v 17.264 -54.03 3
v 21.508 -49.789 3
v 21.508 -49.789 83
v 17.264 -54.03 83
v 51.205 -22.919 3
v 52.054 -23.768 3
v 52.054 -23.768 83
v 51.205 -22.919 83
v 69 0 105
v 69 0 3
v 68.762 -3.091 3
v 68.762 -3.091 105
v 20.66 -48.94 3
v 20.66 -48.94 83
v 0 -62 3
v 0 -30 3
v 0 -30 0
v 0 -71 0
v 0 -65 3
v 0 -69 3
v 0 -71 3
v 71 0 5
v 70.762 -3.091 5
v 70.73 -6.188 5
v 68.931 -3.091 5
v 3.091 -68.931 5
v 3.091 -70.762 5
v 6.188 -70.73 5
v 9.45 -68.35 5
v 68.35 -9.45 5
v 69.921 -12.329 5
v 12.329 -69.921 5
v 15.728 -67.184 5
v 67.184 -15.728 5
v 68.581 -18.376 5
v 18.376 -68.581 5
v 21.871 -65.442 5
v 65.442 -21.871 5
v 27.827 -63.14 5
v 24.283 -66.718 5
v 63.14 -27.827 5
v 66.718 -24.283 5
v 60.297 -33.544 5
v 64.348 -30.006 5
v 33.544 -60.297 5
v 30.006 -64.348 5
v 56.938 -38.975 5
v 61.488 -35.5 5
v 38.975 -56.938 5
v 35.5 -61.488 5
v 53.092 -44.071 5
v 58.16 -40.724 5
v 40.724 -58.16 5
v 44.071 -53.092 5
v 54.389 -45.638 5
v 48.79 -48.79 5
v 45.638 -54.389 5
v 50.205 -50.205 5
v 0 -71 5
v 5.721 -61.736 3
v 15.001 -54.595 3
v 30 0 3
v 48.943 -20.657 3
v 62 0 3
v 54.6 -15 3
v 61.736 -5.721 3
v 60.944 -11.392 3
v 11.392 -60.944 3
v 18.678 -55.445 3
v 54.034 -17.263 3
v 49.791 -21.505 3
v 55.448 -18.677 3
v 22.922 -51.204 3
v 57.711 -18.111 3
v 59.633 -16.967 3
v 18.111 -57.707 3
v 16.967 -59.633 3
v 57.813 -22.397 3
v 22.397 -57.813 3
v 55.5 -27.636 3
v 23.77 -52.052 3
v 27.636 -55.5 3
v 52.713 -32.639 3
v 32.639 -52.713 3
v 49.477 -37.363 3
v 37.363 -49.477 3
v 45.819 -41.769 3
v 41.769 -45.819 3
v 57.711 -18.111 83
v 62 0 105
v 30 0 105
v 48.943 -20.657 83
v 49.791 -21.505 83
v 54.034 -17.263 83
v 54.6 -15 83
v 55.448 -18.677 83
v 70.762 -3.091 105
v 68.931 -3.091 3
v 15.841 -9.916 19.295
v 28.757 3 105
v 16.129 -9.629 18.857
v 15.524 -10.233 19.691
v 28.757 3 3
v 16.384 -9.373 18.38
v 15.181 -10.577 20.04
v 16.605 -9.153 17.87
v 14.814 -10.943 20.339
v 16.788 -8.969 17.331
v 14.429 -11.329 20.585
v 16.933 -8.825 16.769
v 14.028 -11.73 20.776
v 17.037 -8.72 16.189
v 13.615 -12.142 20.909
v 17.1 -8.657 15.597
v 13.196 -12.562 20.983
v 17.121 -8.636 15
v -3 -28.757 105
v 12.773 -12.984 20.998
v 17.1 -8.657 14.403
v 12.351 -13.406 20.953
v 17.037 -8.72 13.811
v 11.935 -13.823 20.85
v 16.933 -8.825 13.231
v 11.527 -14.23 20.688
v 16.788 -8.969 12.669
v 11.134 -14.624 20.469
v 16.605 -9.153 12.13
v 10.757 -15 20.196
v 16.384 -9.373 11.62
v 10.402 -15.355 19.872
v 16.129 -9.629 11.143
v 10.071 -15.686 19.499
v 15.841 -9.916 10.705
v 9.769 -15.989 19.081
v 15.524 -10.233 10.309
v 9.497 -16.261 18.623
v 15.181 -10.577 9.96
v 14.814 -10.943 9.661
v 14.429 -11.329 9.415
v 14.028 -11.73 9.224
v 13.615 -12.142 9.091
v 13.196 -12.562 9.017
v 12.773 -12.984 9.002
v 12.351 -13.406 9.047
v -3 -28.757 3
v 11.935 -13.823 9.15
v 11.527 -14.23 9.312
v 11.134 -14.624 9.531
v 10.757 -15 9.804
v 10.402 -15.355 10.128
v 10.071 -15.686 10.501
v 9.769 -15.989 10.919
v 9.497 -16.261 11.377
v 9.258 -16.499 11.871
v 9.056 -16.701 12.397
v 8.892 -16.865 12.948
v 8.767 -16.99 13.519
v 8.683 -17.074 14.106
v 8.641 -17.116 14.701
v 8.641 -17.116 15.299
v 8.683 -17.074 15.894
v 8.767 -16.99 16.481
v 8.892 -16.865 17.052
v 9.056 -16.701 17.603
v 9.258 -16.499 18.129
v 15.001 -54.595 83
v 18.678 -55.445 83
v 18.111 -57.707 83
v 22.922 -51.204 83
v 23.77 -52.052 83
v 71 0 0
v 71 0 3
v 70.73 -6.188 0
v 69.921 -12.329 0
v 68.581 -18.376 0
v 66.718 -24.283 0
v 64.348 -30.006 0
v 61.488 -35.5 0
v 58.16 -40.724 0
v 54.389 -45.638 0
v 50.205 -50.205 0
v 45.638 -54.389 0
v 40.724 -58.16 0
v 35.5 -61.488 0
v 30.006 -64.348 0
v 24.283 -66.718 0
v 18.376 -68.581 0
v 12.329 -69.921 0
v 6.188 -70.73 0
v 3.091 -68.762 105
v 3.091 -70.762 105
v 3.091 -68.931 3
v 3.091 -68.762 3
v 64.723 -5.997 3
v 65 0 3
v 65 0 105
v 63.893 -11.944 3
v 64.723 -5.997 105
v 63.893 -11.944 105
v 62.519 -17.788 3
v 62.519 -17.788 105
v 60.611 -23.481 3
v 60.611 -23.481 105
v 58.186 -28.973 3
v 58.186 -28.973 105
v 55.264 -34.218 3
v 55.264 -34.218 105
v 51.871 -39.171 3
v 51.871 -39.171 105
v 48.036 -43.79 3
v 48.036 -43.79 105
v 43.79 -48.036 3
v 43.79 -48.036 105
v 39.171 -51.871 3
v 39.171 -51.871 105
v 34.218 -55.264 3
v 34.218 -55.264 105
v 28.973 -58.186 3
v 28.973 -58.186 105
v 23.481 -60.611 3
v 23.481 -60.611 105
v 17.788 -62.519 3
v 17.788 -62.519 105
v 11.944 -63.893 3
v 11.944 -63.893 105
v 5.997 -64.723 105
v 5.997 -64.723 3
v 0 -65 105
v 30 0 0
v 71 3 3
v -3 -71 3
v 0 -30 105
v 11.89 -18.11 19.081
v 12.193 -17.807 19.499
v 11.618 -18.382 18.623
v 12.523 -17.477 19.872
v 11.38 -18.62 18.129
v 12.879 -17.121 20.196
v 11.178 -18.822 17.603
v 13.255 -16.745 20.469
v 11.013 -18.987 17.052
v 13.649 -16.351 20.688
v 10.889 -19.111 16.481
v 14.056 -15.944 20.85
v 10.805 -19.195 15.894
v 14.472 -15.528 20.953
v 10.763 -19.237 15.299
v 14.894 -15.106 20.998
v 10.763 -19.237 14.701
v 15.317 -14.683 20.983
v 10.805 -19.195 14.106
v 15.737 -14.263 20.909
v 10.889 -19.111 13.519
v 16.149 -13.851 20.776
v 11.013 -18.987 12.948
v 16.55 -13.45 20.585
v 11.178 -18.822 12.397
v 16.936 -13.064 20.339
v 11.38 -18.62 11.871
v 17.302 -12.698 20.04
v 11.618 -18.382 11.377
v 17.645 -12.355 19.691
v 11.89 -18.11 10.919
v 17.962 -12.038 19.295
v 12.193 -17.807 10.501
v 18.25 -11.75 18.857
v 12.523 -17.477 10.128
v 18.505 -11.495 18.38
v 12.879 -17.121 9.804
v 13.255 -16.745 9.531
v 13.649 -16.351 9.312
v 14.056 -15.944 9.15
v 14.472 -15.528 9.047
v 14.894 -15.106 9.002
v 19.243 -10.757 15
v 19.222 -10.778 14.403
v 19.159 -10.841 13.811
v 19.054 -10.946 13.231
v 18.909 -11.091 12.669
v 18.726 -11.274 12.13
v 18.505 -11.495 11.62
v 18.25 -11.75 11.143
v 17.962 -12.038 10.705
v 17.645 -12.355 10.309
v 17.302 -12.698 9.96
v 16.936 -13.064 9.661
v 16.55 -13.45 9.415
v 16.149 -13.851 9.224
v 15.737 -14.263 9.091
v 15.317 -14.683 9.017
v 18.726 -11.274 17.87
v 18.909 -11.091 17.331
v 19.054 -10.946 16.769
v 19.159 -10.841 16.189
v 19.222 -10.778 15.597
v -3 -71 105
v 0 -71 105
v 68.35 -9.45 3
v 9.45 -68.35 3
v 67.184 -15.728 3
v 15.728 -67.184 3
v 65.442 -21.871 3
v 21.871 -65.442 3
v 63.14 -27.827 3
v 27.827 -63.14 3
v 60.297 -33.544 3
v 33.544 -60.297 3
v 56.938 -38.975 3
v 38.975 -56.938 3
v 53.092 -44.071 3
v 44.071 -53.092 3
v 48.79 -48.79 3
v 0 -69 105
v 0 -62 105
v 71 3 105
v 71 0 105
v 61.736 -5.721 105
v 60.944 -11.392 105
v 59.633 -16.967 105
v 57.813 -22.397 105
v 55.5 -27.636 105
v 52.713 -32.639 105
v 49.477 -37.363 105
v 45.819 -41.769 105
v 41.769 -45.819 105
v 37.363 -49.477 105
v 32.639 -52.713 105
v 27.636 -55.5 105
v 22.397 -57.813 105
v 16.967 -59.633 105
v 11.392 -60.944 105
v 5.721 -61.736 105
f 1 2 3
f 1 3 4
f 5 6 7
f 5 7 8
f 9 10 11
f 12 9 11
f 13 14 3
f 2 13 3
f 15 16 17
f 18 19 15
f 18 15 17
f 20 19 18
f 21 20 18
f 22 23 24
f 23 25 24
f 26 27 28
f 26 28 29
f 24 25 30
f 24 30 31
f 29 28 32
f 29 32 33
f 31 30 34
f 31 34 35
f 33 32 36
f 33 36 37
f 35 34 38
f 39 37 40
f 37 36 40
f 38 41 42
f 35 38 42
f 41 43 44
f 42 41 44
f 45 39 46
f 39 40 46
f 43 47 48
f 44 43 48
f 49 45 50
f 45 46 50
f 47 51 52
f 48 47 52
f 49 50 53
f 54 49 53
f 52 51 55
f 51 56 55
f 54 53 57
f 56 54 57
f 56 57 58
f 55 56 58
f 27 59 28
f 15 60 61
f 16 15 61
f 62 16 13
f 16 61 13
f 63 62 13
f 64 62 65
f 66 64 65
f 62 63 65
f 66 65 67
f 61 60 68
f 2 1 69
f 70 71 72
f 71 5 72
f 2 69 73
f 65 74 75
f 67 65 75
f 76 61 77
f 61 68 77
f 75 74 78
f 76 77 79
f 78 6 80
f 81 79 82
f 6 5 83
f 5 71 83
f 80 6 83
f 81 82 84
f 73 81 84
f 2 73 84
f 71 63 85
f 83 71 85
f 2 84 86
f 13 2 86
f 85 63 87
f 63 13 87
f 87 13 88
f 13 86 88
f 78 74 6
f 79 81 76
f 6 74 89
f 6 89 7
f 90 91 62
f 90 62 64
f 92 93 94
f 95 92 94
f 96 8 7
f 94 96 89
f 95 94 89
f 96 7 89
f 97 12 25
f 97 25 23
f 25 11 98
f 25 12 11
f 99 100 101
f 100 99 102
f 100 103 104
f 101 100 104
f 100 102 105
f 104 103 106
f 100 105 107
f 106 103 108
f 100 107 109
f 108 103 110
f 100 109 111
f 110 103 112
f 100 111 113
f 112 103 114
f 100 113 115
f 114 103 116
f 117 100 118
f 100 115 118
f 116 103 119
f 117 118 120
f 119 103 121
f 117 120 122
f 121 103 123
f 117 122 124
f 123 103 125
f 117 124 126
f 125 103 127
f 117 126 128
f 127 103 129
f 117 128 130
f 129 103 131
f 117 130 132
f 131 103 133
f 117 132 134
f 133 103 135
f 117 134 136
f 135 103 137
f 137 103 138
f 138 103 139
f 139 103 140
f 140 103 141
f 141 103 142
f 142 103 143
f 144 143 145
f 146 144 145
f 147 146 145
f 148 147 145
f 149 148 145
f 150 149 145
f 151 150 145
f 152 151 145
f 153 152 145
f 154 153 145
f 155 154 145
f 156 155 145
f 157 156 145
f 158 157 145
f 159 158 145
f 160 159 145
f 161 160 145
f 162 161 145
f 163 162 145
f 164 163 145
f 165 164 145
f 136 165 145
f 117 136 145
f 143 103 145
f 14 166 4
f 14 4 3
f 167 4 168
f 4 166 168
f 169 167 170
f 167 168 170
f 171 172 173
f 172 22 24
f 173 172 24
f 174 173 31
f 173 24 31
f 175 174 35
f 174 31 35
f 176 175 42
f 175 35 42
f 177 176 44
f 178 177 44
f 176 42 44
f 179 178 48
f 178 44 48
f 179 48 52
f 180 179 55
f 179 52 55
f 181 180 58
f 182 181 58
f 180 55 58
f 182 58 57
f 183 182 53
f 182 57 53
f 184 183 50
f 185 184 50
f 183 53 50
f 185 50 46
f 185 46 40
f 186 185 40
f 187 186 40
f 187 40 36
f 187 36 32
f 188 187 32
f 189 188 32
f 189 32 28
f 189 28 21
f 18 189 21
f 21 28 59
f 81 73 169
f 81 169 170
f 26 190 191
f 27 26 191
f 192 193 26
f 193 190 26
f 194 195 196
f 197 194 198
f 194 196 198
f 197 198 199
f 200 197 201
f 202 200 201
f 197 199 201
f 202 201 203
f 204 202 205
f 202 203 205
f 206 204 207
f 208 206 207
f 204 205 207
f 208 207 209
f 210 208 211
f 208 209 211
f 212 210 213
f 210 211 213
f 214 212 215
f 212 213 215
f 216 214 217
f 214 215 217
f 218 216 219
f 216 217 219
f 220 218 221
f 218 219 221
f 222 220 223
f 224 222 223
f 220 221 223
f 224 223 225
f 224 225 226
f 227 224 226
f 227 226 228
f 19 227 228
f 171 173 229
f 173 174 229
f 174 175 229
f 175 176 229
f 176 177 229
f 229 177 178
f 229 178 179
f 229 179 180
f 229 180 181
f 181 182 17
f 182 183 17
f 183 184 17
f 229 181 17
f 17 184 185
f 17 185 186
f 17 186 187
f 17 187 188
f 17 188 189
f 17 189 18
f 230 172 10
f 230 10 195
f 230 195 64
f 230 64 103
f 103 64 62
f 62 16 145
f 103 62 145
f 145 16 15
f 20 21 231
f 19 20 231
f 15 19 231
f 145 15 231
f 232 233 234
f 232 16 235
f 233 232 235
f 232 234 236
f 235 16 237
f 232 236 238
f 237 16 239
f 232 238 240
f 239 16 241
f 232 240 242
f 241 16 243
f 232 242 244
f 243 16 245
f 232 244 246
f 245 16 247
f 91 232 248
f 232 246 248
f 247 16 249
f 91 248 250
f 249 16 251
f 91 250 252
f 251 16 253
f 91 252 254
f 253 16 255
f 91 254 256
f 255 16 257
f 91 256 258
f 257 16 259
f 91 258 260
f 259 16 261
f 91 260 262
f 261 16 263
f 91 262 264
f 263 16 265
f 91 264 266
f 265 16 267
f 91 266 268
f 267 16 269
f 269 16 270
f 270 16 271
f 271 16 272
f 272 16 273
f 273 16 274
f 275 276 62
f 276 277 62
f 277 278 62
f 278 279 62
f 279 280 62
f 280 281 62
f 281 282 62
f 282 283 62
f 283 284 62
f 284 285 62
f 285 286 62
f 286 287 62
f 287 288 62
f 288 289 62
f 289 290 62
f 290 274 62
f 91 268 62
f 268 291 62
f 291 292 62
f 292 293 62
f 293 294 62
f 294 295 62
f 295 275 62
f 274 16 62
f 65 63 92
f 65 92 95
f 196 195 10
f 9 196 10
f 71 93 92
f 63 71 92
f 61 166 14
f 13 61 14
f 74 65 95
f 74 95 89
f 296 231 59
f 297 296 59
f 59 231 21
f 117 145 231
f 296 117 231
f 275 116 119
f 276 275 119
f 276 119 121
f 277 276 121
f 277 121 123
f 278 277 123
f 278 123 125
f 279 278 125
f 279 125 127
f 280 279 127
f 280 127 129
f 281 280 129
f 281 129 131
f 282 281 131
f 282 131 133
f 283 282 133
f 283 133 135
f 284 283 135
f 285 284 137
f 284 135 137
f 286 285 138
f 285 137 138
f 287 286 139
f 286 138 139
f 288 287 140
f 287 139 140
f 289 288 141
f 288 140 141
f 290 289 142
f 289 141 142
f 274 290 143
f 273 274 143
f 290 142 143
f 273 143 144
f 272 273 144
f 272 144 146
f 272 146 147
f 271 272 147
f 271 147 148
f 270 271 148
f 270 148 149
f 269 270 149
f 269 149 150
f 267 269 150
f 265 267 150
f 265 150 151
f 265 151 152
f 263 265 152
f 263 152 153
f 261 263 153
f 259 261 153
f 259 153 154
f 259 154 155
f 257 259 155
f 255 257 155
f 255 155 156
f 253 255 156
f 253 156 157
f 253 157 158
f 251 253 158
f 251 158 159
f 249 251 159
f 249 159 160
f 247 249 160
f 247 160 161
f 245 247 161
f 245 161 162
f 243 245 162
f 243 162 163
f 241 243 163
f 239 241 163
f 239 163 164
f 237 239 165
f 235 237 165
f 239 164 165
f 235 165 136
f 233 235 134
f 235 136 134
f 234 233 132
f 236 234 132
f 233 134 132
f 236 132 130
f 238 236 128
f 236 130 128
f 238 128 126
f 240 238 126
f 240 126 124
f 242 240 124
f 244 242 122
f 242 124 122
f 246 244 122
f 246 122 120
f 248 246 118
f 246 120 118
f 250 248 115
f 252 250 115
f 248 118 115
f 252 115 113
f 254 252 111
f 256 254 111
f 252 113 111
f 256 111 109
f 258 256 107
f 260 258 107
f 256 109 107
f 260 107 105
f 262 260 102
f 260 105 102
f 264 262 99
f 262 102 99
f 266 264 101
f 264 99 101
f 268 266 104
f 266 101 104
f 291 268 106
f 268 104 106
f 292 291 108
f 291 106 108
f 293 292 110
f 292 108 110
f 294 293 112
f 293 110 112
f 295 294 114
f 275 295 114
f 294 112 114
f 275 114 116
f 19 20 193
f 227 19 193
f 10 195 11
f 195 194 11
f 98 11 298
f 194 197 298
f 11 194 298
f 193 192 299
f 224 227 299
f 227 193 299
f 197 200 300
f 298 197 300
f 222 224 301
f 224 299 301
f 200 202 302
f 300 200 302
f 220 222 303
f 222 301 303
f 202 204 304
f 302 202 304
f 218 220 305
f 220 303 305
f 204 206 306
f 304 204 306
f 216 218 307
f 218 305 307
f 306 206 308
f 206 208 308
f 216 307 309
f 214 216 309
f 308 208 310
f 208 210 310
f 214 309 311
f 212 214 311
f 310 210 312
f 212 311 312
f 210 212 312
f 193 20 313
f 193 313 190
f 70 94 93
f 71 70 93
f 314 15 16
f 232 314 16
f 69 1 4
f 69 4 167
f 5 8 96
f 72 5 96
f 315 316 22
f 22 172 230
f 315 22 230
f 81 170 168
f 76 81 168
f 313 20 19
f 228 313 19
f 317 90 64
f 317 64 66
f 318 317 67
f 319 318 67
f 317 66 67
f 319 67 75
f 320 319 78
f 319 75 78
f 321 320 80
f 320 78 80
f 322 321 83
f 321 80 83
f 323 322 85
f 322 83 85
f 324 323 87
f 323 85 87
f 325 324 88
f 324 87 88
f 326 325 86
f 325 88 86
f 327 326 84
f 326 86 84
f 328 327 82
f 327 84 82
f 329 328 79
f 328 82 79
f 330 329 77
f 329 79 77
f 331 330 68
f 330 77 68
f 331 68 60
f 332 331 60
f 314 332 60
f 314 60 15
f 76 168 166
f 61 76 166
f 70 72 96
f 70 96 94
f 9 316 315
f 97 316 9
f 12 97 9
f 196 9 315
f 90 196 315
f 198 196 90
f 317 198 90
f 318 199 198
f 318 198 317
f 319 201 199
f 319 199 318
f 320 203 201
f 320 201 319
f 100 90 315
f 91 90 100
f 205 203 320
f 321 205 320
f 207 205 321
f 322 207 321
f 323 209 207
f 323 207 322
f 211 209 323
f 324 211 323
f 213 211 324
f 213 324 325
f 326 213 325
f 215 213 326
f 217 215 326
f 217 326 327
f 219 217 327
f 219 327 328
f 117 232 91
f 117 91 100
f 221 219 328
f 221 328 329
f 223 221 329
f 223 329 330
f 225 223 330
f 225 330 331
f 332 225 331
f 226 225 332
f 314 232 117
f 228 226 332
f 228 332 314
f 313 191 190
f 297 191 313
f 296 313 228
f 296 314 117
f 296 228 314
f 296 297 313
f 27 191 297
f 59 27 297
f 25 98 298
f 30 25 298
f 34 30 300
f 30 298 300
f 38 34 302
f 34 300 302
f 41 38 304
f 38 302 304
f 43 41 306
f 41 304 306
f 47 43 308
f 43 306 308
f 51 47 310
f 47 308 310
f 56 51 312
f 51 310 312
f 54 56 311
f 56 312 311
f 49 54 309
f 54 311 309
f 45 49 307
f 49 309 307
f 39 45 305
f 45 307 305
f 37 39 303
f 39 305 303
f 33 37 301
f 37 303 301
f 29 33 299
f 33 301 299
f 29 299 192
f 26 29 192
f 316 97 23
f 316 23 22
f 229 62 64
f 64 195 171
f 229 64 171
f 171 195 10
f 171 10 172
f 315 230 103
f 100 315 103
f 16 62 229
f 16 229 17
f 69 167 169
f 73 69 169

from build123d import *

# Parameters (mm, degrees)
REVOLUTION_ANGLE = -90
POCKET_DEPTH     = 3
PAD_DEPTH        = 102
PAD001_DEPTH     = 102
PAD002_DEPTH     = 102
SKETCH005_R      = 6
POCKET001_DEPTH  = 3
PAD003_DEPTH     = 80
PAD004_DEPTH     = 80


with BuildPart() as part:
    # Sketch → Revolution (revolve)
    with BuildSketch(Plane.XZ):
        Polygon((0, 0), (71, 0), (71, 5), (69, 5), (69, 3), (65, 3), (65, 105), (62, 105), (62, 3), (0, 3), align=None)
    revolve(axis=Axis((0, 0, 0), (0, 0, 1)), revolution_arc=REVOLUTION_ANGLE)

    # Sketch001 (on Face9 of Revolution) → Pocket (cut)
    with BuildSketch(Plane(origin=(0, 0, 3), x_dir=(-1, 0, 0), z_dir=(0, 0, 1))):
        Polygon((0, 0), (-30, 0), (0, 30), align=None)
    extrude(amount=-POCKET_DEPTH, mode=Mode.SUBTRACT)

    # Sketch002 (on Face7 of Pocket) → Pad (join)
    with BuildSketch(Plane(origin=(0, 0, 3), x_dir=(-1, 0, 0), z_dir=(0, 0, 1))):
        Polygon((0, 71), (0, 30), (-30, 0), (-71, 0), (-71, -3), (-28.7574, -3), (3, 28.7574), (3, 71), align=None)
    extrude(amount=PAD_DEPTH)

    # Sketch003 (on Face24 of Pad) → Pad001 (join)
    with BuildSketch(Plane(origin=(0, 0, 3), x_dir=(-1, 0, 0), z_dir=(0, 0, 1))):
        Polygon((0, 71), (0, 69), (-3.090822, 68.761632), (-3.090822, 70.761632), align=None)
    extrude(amount=PAD001_DEPTH)

    # Sketch004 (on Face28 of Pad001) → Pad002 (join)
    with BuildSketch(Plane(origin=(0, 0, 3), x_dir=(-1, 0, 0), z_dir=(0, 0, 1))):
        Polygon((-71, 0), (-69, 0), (-68.761632, 3.090822), (-70.761632, 3.090822), align=None)
    extrude(amount=PAD002_DEPTH)

    # Sketch005 (on Face18 of Pad002) → Pocket001 (cut)
    with BuildSketch(Plane(origin=(12.8787, -12.8787, 0), x_dir=(0.707107, 0.707107, 0), z_dir=(-0.707107, 0.707107, 0))):
        with Locations((0, -15)):
            Circle(SKETCH005_R)
    extrude(amount=-POCKET001_DEPTH, mode=Mode.SUBTRACT)

    # Sketch006 (on Face33 of Pocket001) → Pad003 (join)
    with BuildSketch(Plane(origin=(0, 0, 3), x_dir=(-1, 0, 0), z_dir=(0, 0, 1))):
        Polygon((-23.770153, 52.052386), (-18.11127, 57.70721), (-15.001117, 54.594824), (-20.66, 48.94), (-21.508224, 49.788833), (-17.264061, 54.029951), (-18.677767, 55.444672), (-22.92193, 51.203553), align=None)
        Polygon((-57.711085, 18.111455), (-52.053894, 23.767973), (-51.205416, 22.919394), (-55.448309, 18.677006), (-54.03418, 17.262708), (-49.791287, 21.505096), (-48.942809, 20.656518), (-54.6, 15), align=None)
    extrude(amount=PAD003_DEPTH)

    # Sketch006 (on Face33 of Pocket001) → Pad004 (join)
    with BuildSketch(Plane(origin=(0, 0, 3), x_dir=(-1, 0, 0), z_dir=(0, 0, 1))):
        Polygon((-23.770153, 52.052386), (-18.11127, 57.70721), (-15.001117, 54.594824), (-20.66, 48.94), (-21.508224, 49.788833), (-17.264061, 54.029951), (-18.677767, 55.444672), (-22.92193, 51.203553), align=None)
        Polygon((-57.711085, 18.111455), (-52.053894, 23.767973), (-51.205416, 22.919394), (-55.448309, 18.677006), (-54.03418, 17.262708), (-49.791287, 21.505096), (-48.942809, 20.656518), (-54.6, 15), align=None)
    extrude(amount=PAD004_DEPTH)


solid = part.part
